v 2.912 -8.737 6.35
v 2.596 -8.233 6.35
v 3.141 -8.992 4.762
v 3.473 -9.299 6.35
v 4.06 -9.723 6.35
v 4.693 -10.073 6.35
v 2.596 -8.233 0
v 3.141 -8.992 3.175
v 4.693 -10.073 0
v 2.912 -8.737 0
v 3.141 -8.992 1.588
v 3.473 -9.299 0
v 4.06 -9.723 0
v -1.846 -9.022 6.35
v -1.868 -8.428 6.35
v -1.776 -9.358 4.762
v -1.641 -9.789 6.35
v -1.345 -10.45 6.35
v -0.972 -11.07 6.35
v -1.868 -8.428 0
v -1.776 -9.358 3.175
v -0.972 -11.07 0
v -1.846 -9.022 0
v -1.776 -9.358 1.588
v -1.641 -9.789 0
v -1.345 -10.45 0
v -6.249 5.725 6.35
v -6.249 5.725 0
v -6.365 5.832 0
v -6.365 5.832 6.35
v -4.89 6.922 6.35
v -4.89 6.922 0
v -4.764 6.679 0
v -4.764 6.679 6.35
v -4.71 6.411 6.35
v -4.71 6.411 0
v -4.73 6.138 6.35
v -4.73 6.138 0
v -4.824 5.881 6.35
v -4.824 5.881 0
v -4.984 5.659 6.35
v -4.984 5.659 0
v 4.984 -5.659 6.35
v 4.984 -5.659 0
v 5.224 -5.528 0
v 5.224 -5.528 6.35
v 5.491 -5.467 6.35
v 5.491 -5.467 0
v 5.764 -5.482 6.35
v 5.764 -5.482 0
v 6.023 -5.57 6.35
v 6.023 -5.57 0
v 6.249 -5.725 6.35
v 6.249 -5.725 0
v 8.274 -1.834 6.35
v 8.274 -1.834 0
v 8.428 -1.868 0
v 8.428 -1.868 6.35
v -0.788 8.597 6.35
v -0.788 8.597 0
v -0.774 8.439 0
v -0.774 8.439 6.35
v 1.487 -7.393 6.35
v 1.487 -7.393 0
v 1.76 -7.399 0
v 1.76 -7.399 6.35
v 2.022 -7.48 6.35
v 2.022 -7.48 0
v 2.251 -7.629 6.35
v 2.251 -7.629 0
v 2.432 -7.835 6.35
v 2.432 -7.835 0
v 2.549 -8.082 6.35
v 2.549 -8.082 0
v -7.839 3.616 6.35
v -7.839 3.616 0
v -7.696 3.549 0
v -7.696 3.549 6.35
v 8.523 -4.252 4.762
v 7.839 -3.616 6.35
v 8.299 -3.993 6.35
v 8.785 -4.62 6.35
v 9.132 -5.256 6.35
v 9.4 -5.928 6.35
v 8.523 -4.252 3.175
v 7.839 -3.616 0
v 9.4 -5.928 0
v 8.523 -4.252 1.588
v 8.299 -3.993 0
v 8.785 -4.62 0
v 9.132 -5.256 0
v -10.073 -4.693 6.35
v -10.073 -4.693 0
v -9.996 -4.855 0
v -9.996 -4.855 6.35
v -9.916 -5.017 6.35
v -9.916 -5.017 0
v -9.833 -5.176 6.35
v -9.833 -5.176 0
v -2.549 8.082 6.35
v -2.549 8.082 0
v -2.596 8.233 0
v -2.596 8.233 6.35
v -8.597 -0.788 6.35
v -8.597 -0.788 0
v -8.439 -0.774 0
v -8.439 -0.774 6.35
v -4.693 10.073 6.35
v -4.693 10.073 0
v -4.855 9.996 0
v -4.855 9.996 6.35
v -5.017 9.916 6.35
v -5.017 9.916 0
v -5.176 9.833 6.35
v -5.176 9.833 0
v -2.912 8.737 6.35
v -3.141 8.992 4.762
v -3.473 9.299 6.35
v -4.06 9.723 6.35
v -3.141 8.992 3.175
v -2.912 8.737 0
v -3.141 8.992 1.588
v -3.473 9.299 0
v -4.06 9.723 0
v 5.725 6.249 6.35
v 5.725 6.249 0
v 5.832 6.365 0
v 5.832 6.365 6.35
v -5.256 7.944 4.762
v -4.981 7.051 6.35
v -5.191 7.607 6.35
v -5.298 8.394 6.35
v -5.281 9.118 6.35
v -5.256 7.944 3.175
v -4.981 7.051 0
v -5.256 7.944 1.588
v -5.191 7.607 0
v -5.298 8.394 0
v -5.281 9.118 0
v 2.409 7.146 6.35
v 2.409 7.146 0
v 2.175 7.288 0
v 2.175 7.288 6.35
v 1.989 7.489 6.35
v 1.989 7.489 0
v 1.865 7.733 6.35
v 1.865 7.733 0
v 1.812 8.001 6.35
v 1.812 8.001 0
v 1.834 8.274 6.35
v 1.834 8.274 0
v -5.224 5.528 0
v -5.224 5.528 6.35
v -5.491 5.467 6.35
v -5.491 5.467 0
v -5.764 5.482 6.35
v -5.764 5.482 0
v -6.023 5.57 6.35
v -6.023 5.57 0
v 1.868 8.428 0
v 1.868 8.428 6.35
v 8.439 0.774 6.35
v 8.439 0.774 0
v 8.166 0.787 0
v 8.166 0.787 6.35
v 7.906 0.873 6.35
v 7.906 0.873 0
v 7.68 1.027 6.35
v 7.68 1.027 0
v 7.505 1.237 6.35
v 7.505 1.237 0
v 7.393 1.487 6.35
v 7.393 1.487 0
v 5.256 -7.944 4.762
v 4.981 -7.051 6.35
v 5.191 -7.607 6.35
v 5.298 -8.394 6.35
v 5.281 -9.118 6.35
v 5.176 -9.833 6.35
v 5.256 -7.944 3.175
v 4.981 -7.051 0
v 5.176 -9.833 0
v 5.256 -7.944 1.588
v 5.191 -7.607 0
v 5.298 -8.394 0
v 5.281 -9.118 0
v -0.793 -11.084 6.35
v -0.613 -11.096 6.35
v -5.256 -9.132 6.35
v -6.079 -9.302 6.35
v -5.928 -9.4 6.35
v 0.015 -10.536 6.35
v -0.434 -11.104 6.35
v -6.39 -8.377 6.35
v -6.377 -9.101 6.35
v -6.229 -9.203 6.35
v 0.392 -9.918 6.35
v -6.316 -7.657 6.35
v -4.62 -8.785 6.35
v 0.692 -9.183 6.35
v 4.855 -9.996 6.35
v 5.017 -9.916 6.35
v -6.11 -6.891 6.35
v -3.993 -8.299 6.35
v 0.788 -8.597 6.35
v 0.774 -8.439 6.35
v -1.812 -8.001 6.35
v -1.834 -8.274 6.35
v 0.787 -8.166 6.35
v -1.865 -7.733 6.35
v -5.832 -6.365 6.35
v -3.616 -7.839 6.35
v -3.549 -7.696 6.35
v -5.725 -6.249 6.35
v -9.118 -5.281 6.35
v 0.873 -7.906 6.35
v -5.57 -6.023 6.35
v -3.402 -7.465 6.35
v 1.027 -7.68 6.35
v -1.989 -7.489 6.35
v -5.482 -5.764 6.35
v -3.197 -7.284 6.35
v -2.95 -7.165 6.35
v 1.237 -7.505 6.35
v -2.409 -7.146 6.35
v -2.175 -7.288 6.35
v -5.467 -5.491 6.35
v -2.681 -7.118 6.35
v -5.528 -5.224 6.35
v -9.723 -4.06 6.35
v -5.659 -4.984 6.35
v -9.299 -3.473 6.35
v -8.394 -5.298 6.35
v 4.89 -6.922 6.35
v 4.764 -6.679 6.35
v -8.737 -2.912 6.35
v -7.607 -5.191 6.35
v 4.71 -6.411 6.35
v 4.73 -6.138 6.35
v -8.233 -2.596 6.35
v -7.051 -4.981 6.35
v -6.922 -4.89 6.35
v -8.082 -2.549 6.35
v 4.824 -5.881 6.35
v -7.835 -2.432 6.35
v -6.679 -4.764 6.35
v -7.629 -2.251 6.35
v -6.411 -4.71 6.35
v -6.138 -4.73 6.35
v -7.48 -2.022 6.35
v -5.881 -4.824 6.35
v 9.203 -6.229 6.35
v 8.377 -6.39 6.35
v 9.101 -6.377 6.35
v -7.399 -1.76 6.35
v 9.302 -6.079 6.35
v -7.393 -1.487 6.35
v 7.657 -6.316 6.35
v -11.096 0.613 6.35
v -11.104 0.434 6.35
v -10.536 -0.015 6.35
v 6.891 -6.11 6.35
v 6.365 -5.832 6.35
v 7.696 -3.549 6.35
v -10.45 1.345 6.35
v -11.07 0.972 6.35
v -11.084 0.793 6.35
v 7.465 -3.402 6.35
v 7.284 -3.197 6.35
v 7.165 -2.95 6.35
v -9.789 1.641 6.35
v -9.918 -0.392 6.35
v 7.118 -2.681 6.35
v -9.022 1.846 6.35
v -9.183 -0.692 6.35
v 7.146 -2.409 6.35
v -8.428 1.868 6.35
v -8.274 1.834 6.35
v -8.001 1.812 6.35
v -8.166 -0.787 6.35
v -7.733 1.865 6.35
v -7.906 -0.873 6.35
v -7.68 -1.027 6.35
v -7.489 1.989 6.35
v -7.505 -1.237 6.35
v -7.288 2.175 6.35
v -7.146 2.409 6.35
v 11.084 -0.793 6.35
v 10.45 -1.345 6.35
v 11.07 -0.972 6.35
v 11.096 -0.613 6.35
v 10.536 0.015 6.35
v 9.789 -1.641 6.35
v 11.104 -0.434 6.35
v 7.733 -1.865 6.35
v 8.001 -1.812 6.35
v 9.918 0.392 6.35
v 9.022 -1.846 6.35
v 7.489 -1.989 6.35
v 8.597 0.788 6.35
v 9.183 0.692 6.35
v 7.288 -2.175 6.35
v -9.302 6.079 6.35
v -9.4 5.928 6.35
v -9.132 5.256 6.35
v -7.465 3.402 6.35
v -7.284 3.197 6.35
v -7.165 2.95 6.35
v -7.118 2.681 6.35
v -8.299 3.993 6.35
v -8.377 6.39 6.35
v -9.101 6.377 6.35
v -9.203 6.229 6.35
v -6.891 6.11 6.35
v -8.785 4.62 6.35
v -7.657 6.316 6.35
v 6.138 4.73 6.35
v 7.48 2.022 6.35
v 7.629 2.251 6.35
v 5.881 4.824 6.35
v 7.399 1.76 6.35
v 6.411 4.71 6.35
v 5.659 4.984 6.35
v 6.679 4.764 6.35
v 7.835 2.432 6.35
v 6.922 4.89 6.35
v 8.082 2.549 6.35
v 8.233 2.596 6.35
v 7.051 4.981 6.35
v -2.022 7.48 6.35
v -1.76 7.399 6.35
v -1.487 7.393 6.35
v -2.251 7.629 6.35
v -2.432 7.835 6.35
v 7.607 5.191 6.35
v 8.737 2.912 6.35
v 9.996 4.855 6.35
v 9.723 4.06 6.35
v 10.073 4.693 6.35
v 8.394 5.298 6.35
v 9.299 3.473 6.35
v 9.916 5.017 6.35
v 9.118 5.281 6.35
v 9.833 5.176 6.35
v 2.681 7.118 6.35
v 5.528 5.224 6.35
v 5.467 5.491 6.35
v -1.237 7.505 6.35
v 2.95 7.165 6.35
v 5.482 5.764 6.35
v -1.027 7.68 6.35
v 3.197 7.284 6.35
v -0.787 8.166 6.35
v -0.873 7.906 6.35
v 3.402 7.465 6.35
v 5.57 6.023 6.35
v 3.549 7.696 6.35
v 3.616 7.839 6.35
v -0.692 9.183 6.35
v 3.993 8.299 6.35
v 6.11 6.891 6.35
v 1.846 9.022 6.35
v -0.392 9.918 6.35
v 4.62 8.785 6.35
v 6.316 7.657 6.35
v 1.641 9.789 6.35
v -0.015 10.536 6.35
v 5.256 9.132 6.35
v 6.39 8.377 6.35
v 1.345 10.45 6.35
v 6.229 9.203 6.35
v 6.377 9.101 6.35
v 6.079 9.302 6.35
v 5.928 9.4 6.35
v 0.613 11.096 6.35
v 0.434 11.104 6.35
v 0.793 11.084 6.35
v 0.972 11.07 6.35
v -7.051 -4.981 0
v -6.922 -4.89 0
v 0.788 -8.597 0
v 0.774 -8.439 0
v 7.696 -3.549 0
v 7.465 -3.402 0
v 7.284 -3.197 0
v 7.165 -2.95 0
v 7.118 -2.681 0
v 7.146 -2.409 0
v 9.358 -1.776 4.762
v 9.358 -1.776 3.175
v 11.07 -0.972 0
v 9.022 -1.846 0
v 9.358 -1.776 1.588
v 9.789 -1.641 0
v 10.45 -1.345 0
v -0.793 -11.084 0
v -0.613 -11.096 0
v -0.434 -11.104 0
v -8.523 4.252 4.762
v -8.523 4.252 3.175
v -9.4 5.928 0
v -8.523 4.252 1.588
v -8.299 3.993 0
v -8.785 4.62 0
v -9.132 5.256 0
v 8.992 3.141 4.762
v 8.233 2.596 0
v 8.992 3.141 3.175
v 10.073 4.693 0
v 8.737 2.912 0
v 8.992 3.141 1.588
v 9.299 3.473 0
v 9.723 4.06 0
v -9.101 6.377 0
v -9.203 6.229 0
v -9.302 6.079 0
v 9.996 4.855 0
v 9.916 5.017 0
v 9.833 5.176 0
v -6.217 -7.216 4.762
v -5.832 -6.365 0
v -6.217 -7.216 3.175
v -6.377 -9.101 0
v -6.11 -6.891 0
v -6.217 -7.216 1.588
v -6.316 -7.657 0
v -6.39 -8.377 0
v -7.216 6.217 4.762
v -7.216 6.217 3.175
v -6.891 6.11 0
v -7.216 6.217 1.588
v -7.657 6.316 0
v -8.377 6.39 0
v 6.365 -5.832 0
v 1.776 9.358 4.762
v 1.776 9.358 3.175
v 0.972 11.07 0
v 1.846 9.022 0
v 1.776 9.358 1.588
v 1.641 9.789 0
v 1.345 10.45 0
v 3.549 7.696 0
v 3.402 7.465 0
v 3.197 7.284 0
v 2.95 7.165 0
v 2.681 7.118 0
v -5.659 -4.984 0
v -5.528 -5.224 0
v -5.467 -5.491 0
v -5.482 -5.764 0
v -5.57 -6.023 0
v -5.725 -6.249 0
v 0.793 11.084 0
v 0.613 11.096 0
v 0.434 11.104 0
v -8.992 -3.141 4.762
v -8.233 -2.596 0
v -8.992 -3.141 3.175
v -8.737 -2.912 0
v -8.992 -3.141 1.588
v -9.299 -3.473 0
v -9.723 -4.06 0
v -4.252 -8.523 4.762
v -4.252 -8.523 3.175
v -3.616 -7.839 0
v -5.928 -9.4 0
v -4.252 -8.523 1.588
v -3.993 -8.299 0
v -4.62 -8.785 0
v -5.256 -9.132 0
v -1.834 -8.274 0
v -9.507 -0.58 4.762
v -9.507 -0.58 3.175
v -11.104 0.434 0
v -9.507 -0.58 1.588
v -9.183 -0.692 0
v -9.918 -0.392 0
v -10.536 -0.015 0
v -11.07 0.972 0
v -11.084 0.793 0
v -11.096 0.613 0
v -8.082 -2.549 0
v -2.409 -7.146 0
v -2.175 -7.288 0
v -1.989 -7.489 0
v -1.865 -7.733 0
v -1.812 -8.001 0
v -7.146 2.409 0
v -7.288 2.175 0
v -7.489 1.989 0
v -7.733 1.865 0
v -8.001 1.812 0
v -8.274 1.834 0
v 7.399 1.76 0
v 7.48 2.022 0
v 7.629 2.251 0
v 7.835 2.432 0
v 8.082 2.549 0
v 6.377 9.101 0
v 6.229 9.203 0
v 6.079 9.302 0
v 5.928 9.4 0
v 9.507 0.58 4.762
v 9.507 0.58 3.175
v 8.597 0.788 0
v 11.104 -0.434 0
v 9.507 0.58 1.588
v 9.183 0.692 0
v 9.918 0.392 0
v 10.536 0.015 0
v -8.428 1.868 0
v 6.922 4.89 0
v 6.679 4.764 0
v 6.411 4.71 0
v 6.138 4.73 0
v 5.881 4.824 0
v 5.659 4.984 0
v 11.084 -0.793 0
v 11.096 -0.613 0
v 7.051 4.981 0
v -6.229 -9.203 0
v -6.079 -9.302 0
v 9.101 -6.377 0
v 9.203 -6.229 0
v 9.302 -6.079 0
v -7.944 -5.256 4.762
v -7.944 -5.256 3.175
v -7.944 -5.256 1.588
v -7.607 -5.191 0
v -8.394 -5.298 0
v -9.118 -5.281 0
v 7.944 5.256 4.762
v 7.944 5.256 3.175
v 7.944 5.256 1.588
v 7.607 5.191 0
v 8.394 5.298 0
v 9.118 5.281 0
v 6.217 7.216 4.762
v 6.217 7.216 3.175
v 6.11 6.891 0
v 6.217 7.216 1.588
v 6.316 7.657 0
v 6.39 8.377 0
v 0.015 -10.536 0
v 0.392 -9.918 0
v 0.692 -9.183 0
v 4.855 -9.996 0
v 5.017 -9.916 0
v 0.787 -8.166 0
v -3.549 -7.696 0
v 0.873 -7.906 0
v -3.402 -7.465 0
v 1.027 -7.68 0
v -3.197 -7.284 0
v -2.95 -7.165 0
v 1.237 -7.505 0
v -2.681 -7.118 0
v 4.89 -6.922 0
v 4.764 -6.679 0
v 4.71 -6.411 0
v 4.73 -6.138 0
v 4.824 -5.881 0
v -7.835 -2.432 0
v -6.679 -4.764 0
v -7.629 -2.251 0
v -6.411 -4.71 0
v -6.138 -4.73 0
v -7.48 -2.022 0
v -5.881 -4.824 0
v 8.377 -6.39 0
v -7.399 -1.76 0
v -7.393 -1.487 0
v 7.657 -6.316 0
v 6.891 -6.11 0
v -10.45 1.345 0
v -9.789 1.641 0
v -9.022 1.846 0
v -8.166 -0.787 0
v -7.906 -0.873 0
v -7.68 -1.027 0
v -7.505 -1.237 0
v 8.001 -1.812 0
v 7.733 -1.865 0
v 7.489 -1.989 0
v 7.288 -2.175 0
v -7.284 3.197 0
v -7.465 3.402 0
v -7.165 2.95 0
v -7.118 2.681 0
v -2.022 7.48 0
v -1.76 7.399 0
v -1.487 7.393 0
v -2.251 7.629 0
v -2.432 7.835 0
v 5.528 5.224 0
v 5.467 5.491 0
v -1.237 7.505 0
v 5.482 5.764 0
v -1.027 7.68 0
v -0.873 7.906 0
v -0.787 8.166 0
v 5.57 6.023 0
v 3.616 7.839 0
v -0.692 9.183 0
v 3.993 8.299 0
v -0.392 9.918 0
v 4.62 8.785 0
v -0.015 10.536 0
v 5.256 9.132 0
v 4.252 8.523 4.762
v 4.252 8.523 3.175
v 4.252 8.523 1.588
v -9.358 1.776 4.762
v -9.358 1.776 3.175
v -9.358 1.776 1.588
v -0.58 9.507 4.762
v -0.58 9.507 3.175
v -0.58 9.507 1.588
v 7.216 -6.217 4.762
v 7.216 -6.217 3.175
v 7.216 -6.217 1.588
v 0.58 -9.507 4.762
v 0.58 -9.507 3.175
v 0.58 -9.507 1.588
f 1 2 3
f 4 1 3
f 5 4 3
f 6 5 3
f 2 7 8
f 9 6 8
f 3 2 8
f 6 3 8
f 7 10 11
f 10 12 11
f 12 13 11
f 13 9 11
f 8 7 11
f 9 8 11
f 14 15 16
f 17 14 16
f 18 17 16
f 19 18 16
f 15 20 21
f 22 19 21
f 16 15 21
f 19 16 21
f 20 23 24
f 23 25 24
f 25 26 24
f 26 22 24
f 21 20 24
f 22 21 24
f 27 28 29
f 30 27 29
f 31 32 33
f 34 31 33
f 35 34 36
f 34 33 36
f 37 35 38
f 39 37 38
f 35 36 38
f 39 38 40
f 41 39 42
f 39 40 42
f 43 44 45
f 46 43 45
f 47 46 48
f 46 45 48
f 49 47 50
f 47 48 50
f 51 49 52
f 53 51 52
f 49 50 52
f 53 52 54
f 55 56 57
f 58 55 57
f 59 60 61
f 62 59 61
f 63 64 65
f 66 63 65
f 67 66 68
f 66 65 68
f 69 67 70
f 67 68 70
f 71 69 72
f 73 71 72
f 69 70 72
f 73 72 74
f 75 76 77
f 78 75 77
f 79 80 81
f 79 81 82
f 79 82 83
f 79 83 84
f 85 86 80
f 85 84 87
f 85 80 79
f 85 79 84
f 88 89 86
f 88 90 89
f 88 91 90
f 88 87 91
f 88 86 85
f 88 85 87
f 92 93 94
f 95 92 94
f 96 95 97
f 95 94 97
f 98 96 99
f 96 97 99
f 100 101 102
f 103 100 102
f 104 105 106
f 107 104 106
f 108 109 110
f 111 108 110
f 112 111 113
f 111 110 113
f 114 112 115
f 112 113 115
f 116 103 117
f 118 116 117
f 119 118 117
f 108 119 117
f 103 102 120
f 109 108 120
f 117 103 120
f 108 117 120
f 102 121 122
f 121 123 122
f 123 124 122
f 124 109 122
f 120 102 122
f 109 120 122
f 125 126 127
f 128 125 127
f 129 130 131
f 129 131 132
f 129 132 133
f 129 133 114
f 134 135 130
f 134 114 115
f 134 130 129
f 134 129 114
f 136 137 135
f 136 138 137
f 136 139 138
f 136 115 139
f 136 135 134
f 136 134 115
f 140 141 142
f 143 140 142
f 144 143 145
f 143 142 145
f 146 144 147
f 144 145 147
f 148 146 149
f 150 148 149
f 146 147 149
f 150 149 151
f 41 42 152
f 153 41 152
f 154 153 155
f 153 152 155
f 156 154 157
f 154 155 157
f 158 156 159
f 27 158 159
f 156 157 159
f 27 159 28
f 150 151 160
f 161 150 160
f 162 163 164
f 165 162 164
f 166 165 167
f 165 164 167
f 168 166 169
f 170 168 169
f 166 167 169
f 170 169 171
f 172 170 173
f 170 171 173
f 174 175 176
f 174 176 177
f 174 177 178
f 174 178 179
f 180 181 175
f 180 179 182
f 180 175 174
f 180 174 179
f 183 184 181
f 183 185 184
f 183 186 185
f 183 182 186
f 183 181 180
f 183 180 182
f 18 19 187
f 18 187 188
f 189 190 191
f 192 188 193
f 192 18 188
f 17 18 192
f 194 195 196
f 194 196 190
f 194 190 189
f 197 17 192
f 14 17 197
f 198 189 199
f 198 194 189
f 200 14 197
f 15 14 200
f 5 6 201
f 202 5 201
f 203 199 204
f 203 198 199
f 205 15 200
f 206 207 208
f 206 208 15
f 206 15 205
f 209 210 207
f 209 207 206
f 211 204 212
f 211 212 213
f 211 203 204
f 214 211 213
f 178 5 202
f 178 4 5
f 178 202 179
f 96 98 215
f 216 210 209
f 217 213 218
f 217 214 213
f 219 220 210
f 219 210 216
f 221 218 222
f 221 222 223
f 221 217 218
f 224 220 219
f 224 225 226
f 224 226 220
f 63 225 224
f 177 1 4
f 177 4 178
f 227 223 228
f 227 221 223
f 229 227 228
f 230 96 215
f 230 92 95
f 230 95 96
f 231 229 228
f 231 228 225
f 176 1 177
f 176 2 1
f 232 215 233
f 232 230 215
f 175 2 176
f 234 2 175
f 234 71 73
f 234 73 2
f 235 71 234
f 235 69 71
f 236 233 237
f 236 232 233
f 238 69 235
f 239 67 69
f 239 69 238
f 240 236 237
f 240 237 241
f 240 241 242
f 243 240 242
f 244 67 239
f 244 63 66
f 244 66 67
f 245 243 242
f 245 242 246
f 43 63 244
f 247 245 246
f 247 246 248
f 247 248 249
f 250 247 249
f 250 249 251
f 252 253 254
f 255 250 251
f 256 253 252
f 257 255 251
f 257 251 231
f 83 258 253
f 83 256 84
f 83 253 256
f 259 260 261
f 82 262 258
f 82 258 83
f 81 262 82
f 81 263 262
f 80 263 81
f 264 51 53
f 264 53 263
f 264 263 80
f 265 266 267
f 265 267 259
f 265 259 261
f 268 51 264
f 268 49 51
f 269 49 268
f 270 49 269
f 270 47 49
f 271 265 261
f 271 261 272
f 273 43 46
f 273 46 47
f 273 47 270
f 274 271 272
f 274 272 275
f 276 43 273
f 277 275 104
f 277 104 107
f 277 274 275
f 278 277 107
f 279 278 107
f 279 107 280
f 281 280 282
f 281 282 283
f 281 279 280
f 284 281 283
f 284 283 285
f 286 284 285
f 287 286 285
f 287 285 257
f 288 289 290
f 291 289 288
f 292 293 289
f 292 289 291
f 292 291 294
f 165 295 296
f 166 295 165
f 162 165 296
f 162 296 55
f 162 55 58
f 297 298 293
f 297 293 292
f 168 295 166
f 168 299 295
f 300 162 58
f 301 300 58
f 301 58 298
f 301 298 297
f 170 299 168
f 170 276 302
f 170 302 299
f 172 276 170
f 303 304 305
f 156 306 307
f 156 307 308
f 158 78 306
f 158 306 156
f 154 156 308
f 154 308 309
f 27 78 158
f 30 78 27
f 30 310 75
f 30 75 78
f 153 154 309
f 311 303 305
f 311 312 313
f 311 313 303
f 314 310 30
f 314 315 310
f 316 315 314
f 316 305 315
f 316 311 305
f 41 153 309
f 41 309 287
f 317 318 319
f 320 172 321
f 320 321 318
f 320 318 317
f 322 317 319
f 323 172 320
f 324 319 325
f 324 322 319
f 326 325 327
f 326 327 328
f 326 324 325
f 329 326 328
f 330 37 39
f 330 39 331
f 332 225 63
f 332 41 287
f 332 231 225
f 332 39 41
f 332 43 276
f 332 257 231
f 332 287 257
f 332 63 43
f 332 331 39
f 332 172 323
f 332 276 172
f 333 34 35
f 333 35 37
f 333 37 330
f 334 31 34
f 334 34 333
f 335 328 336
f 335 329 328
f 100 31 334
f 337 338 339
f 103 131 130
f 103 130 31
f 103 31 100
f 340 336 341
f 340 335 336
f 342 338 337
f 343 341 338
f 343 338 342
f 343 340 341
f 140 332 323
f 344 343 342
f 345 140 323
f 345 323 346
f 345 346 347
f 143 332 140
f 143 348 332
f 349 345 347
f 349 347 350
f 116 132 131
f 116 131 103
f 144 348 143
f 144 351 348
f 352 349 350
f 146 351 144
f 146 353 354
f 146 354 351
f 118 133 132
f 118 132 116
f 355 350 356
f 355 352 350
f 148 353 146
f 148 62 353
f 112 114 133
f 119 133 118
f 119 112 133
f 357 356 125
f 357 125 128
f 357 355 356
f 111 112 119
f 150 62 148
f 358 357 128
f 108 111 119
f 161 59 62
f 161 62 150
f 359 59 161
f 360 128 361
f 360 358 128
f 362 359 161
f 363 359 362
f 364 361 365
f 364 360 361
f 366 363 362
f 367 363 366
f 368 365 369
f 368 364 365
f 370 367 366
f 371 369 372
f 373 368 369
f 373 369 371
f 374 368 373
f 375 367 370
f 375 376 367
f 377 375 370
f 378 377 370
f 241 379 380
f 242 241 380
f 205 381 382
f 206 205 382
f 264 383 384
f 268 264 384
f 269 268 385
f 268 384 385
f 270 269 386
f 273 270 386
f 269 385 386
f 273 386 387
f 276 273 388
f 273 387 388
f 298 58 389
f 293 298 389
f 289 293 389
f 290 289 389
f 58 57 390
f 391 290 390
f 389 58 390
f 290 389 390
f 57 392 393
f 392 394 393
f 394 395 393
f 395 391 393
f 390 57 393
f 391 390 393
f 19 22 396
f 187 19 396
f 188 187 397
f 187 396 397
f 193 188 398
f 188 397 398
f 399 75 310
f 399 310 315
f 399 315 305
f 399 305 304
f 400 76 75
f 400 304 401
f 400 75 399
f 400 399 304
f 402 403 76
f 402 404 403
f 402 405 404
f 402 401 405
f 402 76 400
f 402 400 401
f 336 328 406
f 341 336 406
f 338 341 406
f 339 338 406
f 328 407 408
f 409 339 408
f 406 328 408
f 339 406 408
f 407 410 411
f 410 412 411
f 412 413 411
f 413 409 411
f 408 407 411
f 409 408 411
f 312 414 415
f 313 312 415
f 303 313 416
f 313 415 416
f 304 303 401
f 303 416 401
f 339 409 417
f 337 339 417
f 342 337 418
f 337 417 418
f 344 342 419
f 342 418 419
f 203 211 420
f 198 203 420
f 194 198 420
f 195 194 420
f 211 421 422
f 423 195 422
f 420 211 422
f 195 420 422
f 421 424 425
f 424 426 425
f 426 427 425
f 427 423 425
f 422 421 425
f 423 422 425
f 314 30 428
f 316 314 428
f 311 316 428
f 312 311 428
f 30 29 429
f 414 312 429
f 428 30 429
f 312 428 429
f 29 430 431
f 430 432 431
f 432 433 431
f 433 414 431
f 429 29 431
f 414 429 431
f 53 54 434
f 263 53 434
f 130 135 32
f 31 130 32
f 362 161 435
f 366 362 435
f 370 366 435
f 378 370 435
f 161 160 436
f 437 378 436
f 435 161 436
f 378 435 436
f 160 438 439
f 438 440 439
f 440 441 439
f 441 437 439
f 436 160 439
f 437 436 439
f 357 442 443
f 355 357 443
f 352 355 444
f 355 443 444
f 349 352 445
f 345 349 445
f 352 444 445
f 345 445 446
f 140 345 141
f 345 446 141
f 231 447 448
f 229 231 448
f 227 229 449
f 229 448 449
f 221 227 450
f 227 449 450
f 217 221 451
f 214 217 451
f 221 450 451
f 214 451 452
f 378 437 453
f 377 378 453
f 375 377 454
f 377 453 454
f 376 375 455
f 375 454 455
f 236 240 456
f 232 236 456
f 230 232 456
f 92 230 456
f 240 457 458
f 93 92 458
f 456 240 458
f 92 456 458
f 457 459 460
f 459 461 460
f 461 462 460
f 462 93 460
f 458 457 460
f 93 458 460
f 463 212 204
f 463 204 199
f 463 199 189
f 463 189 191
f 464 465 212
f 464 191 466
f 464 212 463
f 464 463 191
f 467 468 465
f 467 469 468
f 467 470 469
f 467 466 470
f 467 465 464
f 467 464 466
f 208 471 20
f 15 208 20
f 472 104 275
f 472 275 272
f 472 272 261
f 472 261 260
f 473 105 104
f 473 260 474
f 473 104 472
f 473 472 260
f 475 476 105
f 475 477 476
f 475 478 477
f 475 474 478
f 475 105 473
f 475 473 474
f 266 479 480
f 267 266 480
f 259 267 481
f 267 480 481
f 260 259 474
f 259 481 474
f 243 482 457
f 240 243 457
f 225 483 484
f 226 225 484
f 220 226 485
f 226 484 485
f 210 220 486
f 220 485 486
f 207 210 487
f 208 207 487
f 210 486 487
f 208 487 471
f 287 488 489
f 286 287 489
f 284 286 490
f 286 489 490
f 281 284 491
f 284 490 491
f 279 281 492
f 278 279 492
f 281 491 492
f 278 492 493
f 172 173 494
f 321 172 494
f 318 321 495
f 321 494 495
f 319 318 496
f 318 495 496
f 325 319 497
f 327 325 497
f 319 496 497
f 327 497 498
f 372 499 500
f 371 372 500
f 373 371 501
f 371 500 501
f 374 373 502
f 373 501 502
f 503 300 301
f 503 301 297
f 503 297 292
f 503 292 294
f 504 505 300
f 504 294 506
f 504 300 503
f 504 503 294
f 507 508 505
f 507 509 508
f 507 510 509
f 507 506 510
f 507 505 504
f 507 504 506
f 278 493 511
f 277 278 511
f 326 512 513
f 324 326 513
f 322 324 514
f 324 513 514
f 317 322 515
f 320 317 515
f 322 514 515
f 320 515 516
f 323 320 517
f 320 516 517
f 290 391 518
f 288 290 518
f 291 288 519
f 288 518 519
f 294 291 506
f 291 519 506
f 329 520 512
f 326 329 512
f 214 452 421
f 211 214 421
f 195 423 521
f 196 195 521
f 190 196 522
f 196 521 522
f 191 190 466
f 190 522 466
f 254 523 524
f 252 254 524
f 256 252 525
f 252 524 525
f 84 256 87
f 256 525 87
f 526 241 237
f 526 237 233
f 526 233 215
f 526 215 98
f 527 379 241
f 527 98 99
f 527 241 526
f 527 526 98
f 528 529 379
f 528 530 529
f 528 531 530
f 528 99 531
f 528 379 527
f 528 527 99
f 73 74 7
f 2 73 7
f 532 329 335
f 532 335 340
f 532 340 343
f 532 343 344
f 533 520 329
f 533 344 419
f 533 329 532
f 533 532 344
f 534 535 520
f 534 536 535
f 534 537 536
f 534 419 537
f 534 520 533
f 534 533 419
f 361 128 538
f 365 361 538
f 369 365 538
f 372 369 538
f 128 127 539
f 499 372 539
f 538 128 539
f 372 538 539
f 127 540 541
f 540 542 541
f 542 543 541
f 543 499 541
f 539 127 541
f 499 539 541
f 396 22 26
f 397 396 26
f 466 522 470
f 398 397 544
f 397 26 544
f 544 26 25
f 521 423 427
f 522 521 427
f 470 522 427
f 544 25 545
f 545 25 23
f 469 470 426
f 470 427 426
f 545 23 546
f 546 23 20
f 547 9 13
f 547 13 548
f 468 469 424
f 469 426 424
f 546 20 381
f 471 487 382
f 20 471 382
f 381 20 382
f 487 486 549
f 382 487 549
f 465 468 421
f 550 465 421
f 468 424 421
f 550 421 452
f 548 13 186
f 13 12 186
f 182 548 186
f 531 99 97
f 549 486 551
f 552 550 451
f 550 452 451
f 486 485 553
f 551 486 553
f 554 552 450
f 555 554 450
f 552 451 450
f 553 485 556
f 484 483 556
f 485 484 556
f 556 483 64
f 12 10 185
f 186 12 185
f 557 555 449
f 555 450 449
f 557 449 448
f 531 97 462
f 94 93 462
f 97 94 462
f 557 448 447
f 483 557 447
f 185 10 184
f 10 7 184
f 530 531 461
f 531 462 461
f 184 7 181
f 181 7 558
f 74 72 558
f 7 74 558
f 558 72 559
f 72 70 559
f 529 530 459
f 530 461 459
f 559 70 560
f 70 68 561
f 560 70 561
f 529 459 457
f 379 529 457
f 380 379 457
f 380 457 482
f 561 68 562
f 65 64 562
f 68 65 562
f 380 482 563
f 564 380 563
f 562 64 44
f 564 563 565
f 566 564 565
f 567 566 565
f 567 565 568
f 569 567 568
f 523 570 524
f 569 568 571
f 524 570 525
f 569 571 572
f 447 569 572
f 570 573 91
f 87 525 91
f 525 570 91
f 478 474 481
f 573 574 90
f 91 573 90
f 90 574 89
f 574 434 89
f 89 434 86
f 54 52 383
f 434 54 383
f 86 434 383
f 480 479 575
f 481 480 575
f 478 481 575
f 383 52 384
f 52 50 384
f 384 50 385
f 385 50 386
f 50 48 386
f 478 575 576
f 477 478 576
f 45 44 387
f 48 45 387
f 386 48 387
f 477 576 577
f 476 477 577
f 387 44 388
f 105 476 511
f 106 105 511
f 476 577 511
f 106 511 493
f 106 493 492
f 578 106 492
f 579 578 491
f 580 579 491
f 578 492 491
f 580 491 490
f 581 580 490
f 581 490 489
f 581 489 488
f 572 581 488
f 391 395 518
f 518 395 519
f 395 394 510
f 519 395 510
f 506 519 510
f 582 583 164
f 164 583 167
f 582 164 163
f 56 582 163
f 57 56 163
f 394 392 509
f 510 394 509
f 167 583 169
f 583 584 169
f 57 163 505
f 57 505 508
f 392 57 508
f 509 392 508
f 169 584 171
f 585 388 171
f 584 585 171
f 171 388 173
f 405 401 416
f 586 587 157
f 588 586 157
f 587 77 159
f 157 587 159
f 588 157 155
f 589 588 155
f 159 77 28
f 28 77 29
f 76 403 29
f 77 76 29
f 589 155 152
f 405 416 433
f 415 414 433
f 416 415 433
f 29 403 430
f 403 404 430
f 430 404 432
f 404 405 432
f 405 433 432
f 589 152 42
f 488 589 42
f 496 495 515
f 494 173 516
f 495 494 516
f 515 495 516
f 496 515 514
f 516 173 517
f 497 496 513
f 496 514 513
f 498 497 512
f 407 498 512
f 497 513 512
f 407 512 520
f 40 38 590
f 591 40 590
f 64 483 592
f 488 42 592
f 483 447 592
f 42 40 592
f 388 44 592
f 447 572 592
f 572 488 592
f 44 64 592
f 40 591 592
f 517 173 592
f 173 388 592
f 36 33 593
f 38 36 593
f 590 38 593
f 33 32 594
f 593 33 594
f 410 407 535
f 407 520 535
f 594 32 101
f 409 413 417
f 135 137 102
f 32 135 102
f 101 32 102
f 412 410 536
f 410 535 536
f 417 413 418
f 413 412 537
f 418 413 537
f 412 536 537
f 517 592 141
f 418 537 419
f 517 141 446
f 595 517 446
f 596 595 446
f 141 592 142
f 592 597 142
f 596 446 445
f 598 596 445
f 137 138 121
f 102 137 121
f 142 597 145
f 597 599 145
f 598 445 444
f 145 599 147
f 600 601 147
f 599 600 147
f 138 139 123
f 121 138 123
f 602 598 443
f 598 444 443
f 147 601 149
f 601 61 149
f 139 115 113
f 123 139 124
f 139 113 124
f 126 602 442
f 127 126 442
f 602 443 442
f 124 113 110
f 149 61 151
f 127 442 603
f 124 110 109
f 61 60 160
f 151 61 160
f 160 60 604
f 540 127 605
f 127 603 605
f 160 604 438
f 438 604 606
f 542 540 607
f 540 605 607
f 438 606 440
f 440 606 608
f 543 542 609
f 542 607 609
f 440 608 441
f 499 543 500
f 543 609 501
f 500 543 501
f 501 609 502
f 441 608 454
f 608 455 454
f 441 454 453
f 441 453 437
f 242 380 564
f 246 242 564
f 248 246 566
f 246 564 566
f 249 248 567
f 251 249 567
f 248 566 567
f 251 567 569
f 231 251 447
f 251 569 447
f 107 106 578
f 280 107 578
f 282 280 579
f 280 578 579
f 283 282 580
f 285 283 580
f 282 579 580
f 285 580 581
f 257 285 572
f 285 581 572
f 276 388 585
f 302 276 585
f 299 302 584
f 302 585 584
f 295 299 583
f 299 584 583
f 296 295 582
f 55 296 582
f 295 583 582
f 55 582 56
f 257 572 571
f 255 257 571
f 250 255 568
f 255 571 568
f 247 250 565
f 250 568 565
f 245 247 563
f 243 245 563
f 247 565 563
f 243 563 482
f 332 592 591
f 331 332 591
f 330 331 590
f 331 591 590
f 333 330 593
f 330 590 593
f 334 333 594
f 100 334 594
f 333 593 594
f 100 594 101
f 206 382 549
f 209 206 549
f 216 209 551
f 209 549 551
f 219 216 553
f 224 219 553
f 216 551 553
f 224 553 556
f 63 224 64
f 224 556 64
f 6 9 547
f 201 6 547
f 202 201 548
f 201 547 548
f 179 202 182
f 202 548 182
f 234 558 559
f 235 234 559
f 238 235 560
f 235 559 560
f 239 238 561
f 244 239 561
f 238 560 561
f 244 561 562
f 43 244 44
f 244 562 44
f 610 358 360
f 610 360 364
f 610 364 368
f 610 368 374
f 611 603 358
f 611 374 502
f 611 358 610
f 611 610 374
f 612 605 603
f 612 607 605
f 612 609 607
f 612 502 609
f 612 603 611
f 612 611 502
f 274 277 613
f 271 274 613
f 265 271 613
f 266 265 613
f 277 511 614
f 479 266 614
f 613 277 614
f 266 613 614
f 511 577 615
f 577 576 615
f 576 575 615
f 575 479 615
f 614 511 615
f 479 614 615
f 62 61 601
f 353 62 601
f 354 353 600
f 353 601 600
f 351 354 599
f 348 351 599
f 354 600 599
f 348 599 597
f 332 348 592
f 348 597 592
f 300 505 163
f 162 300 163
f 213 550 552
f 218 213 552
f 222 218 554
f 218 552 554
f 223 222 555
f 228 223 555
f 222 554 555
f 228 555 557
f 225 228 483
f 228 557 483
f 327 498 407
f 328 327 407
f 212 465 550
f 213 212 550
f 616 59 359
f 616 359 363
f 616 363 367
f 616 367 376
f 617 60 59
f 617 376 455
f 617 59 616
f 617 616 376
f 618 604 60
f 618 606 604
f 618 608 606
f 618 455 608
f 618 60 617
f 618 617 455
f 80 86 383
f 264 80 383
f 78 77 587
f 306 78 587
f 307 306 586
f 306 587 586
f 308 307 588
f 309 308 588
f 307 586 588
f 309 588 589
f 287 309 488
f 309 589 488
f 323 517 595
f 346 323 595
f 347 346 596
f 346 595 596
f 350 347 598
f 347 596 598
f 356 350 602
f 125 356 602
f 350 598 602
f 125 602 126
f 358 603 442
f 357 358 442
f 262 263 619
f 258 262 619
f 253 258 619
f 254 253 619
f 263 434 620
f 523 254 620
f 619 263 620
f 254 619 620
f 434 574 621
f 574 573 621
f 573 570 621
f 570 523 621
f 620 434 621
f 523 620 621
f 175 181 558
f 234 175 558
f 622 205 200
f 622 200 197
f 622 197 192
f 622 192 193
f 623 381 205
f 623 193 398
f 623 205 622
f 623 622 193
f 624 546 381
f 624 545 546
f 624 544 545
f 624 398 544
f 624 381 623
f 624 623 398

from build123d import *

# Parameters (mm, degrees)
SKETCH1_R           = 7.540625
BOSS_EXTRUDE1_DEPTH = 6.35
BOSS_EXTRUDE2_START = -6.35
BOSS_EXTRUDE2_DEPTH = 6.35
CIRPATTERN1_COUNT   = 12


with BuildPart() as part:
    # Sketch1 → Boss-Extrude1 (new body)
    with BuildSketch(Plane.XY):
        Circle(SKETCH1_R)
    extrude(amount=BOSS_EXTRUDE1_DEPTH)

    # Sketch2 → Boss-Extrude2 (add)
    with BuildSketch(Plane.XY.offset(6.35).offset(BOSS_EXTRUDE2_START)):
        with BuildLine():
            ThreePointArc((2.408682376, 7.145577276), (1.918658971, 7.606631761), (1.833740268, 8.274076882))
            Line((1.833740268, 8.274076882), (1.867871498, 8.428081478))
            add(Edge.make_bspline(
                [(1.867871498, 8.428081478), (1.890027, 8.589642819), (1.874125743, 8.904843151), (1.802963997, 9.264708669), (1.59380668, 10.019577882), (1.295108843, 10.591204175), (0.97244699, 11.069869155)],
                knots=[0, 0, 0, 0, 0.17205105, 0.330899491, 0.387189732, 1, 1, 1, 1], degree=3))
            ThreePointArc((0.97244699, 11.069869155), (0.703237725, 11.09022601), (0.433613377, 11.10403691))
            add(Edge.make_bspline(
                [(-0.788332001, 8.596512897), (-0.789902704, 8.75957873), (-0.734314822, 9.070245894), (-0.61826726, 9.41824036), (-0.315435205, 10.140644028), (0.053074174, 10.669962321), (0.433613377, 11.10403691)],
                knots=[0, 0, 0, 0, 0.17205105, 0.330899491, 0.387189732, 1, 1, 1, 1], degree=3))
            Line((-0.788332001, 8.596512897), (-0.773926973, 8.439430589))
            ThreePointArc((-0.773926973, 8.439430589), (-0.942472693, 7.788057795), (-1.48680851, 7.392592633))
            ThreePointArc((-1.48680851, 7.392592633), (0.477197028, 7.525510507), (2.408682376, 7.145577276))
        make_face()
    boss_extrude2 = extrude(amount=BOSS_EXTRUDE2_DEPTH)

    # CirPattern1: Boss-Extrude2 ×12 about axis
    cirpattern1_axis = Axis((0, 0, 6.35), (0, 0, -1))
    for i in range(1, CIRPATTERN1_COUNT):
        add(boss_extrude2.rotate(cirpattern1_axis, i * 360 / CIRPATTERN1_COUNT))


solid = part.part
